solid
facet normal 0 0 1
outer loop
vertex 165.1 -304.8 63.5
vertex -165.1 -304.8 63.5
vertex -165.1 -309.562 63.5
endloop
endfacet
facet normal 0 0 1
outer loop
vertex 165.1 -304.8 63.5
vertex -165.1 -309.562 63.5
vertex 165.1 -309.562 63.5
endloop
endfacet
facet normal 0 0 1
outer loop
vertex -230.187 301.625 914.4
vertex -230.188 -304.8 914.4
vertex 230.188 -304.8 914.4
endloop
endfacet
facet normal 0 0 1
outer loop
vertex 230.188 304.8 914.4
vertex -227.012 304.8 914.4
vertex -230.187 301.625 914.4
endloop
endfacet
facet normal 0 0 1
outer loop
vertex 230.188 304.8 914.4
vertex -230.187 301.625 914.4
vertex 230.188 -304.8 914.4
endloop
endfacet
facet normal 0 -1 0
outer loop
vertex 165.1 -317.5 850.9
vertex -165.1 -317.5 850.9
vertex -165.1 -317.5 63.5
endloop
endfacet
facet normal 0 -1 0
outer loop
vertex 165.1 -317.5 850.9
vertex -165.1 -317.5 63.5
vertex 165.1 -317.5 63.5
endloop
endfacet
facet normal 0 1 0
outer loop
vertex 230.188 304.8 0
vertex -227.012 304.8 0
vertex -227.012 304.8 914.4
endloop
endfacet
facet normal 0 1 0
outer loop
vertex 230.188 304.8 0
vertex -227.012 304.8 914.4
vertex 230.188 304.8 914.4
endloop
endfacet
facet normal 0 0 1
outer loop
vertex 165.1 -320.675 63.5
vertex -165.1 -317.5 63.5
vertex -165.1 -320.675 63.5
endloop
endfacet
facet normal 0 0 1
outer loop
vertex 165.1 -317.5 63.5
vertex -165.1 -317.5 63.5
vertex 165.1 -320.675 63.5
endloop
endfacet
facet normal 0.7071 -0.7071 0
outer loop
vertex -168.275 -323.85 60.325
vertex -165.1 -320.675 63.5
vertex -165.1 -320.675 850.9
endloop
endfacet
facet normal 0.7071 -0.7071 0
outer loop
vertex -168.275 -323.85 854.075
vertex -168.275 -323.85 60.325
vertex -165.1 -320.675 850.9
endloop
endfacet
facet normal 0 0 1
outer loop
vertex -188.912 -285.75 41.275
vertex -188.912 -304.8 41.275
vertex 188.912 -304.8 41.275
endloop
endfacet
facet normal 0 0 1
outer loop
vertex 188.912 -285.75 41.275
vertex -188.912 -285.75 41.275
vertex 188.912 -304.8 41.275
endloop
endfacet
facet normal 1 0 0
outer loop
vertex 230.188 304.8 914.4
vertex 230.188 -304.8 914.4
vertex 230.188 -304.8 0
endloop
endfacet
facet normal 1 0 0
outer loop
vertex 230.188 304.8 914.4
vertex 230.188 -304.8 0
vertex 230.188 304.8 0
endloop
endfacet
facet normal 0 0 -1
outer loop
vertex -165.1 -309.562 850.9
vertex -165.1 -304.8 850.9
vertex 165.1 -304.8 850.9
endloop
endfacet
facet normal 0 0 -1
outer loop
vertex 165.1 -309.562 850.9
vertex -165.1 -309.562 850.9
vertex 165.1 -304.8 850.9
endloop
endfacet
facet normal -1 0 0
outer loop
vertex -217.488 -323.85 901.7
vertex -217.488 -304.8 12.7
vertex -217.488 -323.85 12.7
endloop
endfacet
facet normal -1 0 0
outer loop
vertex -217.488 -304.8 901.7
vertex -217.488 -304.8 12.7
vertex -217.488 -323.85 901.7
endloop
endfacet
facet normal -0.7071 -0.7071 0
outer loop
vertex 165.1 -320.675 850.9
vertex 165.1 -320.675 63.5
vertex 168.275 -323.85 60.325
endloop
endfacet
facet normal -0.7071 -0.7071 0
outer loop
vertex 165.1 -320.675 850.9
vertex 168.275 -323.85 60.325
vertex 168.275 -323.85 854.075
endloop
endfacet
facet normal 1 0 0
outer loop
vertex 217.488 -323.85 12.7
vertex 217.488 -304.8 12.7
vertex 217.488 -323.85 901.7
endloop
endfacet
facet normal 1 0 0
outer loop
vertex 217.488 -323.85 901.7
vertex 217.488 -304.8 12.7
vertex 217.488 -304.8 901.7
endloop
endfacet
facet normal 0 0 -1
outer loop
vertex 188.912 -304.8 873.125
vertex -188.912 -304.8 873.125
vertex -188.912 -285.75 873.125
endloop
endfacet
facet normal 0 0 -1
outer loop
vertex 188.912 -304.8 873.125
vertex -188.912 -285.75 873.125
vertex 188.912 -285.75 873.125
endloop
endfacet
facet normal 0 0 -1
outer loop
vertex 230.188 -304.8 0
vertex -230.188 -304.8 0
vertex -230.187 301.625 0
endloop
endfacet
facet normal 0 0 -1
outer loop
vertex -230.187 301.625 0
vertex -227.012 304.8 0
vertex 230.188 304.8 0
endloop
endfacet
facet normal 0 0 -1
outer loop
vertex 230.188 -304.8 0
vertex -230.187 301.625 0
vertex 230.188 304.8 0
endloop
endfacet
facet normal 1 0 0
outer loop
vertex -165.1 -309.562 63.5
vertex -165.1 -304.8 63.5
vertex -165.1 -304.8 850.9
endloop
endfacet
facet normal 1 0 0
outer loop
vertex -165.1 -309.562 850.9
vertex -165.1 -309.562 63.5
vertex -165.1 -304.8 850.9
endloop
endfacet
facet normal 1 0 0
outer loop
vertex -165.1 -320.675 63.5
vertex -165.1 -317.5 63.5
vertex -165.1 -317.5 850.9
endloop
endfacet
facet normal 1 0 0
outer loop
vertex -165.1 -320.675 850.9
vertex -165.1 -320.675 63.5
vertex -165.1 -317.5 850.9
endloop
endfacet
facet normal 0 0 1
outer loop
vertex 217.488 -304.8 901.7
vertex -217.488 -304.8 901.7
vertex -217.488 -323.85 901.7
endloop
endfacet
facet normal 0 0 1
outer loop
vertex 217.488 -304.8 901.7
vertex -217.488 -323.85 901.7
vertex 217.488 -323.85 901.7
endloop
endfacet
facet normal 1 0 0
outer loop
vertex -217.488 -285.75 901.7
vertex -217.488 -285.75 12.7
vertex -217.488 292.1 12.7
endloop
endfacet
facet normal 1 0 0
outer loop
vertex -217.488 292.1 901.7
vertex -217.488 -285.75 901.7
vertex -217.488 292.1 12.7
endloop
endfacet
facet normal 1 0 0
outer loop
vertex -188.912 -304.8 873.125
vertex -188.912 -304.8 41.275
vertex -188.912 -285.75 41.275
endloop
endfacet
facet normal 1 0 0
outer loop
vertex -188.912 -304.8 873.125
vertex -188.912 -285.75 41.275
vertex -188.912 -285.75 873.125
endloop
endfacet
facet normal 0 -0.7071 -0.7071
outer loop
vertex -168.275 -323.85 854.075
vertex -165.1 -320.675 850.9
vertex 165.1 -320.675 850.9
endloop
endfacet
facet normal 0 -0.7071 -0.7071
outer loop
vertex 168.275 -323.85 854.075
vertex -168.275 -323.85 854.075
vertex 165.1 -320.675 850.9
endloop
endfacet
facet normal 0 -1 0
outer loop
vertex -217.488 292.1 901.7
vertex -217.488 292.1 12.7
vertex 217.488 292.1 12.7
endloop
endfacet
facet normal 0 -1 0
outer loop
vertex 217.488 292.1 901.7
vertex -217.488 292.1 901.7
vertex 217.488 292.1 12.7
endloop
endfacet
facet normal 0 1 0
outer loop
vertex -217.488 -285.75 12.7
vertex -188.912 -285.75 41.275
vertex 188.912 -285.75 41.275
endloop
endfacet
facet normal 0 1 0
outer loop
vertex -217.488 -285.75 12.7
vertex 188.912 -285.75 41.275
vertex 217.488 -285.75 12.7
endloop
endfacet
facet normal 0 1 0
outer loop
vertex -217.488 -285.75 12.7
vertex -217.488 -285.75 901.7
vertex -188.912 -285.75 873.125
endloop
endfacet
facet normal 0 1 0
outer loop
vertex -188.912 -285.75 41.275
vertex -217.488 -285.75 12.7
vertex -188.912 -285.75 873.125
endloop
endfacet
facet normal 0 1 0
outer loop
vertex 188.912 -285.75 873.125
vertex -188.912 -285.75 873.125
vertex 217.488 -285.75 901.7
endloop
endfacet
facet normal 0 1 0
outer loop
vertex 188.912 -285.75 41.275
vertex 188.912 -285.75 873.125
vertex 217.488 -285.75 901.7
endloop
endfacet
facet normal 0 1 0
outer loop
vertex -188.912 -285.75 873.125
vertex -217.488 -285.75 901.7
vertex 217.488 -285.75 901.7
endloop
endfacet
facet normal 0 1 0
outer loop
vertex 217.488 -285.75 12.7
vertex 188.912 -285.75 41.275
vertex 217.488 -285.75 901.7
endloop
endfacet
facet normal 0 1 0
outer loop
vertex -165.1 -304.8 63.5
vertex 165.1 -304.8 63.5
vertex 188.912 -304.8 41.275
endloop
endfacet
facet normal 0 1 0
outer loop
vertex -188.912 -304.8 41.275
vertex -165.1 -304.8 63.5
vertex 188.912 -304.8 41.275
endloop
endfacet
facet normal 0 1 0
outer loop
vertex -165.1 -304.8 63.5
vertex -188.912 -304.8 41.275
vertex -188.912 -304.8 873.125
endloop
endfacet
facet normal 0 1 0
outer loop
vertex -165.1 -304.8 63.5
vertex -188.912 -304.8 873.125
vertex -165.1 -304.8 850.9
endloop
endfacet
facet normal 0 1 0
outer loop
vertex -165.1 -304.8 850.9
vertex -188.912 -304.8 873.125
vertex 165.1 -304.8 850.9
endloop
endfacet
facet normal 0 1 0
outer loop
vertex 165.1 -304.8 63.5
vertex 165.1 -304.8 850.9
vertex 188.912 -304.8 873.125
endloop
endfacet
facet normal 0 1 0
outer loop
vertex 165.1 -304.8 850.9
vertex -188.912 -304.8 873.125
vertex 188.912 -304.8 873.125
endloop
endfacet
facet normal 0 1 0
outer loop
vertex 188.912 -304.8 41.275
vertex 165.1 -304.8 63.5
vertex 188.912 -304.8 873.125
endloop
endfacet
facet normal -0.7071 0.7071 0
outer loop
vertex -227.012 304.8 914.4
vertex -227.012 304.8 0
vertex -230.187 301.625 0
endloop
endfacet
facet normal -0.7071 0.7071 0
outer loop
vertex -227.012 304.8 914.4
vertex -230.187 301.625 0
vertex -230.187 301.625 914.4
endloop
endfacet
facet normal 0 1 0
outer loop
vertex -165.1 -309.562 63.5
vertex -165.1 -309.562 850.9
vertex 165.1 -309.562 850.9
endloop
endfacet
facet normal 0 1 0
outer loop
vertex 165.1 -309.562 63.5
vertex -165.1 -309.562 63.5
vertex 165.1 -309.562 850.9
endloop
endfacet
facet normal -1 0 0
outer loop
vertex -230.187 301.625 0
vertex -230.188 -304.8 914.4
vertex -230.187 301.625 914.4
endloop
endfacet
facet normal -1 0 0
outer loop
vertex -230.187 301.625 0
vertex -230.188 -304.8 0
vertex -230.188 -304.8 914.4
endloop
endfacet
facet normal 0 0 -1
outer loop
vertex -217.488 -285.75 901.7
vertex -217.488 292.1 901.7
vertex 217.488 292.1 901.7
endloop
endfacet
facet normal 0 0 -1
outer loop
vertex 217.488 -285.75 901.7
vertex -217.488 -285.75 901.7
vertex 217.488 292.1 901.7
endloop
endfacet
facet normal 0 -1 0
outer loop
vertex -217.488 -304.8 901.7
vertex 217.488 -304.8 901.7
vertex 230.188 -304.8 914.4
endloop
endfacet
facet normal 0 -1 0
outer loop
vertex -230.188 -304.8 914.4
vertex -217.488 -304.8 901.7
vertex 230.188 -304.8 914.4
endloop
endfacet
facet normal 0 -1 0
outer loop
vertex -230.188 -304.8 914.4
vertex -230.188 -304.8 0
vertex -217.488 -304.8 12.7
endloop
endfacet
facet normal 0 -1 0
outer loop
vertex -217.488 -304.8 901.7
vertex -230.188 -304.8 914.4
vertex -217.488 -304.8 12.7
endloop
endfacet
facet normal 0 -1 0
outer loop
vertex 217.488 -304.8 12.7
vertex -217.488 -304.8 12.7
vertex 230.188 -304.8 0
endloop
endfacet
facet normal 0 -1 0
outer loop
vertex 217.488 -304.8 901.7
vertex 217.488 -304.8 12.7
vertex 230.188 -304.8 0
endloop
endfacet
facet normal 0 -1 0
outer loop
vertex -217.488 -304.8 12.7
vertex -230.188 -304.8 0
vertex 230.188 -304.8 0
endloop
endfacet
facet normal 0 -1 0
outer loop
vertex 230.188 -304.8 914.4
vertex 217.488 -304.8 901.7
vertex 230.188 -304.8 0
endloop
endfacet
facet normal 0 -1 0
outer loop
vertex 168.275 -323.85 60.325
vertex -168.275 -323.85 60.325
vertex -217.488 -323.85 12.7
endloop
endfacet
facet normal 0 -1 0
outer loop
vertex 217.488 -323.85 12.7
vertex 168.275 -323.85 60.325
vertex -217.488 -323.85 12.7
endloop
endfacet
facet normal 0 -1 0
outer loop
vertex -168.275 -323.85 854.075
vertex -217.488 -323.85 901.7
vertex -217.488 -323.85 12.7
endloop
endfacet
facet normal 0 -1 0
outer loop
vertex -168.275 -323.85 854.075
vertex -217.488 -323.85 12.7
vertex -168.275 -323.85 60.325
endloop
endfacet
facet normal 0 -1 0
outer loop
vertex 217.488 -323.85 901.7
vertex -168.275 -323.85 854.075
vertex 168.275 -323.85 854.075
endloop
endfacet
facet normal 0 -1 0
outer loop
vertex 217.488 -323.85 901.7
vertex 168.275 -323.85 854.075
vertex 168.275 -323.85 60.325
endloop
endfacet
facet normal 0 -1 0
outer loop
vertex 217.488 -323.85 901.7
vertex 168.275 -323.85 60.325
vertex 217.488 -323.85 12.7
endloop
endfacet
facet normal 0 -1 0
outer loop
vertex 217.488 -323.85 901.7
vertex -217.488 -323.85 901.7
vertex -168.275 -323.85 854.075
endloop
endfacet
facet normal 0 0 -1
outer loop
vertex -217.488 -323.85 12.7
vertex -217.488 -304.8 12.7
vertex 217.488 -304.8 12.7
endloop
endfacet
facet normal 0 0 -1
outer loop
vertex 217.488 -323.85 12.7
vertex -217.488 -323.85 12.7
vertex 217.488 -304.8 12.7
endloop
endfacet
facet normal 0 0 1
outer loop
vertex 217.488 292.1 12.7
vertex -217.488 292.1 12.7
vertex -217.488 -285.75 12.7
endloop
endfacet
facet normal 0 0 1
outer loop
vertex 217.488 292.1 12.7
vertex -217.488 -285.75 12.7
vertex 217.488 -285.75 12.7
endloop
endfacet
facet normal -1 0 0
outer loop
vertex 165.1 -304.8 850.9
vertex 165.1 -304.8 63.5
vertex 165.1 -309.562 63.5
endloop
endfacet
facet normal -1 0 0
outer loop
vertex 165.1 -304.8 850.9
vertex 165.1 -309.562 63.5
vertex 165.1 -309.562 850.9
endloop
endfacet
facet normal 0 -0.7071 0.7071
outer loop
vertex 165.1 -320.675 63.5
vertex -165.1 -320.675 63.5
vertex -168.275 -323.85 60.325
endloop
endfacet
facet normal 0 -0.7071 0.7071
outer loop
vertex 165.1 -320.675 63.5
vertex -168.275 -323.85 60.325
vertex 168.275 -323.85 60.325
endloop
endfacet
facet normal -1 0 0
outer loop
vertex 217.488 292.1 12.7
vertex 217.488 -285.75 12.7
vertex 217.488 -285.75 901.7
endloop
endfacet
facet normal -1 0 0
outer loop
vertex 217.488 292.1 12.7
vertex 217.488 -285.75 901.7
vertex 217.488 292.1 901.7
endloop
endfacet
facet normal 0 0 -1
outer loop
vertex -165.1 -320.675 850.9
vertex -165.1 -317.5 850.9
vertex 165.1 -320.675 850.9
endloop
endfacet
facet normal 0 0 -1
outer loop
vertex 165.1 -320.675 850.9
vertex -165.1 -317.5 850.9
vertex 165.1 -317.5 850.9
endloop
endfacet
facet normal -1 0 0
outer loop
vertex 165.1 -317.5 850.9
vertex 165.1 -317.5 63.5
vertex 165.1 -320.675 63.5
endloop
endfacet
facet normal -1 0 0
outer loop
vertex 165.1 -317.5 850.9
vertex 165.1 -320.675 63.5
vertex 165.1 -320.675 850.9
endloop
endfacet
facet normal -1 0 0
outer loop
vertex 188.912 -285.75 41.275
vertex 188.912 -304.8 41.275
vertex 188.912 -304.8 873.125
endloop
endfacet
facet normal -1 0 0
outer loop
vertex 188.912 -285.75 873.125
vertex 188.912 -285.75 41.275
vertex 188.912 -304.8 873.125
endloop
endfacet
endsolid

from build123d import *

# Parameters (mm, degrees)
F0_W     = 460.375
F0_H     = 609.6
F1_DEPTH = 914.4
F2_T     = -12.7
F3_W     = 460.375
F3_H     = 914.4
F3_W_2   = 444.5
F3_H_2   = 901.7
F3_W_3   = 434.975
F3_H_3   = 889
F3_W_4   = 377.825
F3_H_4   = 831.85
F4_DEPTH = 19.05
F3_W_5   = 330.2
F3_H_5   = 787.4
F5_DEPTH = 19.05
F6_W     = 330.2
F6_H     = 7.9375
F7_DEPTH = 787.4
F8_SIZE  = 3.175


with BuildPart() as f1:
    # F0 (on Top) → F1 (new body)
    with BuildSketch(Plane.XY):
        Rectangle(F0_W, F0_H)
    extrude(amount=F1_DEPTH)

    # F2
    f2_openings = [f1.faces().sort_by_distance(p)[0] for p in [
        (0, -304.8, 457.2),
    ]]
    offset(amount=F2_T, openings=f2_openings)

    # F3 (on face) → F4 (join)
    with BuildSketch(Plane.XZ.offset(304.8)):
        with Locations((0, 457.2)):
            Rectangle(F3_W, F3_H)
        with Locations((0, 457.2)):
            Rectangle(F3_W_2, F3_H_2, mode=Mode.SUBTRACT)
        with Locations((0, 457.2)):
            Rectangle(F3_W_3, F3_H_3)
        with Locations((0, 457.2)):
            Rectangle(F3_W_4, F3_H_4, mode=Mode.SUBTRACT)
    extrude(amount=-F4_DEPTH)

    # F3 (on face) → F5 (join)
    with BuildSketch(Plane.XZ.offset(304.8)):
        with Locations((0, 457.2)):
            Rectangle(F3_W_3, F3_H_3)
        with Locations((0, 457.2)):
            Rectangle(F3_W_4, F3_H_4, mode=Mode.SUBTRACT)
        with Locations((0, 457.2)):
            Rectangle(F3_W_4, F3_H_4)
        with Locations((0, 457.2)):
            Rectangle(F3_W_5, F3_H_5, mode=Mode.SUBTRACT)
    extrude(amount=F5_DEPTH)

    # F6 (on face) → F7 (join, through all)
    with BuildSketch(Plane(origin=(0, 0, 850.9), x_dir=(1, 0, 0), z_dir=(0, 0, -1))):
        with Locations((0, 313.53125)):
            Rectangle(F6_W, F6_H)
    extrude(amount=F7_DEPTH)

    # F8
    f8_edges = [f1.edges().sort_by_distance(p)[0] for p in [
        (0, -323.85, 63.5),
        (-165.1, -323.85, 457.2),
        (165.1, -323.85, 457.2),
        (0, -323.85, 850.9),
        (-230.1875, 304.8, 457.2),
    ]]
    chamfer(f8_edges, length=F8_SIZE)


solid = f1.part
